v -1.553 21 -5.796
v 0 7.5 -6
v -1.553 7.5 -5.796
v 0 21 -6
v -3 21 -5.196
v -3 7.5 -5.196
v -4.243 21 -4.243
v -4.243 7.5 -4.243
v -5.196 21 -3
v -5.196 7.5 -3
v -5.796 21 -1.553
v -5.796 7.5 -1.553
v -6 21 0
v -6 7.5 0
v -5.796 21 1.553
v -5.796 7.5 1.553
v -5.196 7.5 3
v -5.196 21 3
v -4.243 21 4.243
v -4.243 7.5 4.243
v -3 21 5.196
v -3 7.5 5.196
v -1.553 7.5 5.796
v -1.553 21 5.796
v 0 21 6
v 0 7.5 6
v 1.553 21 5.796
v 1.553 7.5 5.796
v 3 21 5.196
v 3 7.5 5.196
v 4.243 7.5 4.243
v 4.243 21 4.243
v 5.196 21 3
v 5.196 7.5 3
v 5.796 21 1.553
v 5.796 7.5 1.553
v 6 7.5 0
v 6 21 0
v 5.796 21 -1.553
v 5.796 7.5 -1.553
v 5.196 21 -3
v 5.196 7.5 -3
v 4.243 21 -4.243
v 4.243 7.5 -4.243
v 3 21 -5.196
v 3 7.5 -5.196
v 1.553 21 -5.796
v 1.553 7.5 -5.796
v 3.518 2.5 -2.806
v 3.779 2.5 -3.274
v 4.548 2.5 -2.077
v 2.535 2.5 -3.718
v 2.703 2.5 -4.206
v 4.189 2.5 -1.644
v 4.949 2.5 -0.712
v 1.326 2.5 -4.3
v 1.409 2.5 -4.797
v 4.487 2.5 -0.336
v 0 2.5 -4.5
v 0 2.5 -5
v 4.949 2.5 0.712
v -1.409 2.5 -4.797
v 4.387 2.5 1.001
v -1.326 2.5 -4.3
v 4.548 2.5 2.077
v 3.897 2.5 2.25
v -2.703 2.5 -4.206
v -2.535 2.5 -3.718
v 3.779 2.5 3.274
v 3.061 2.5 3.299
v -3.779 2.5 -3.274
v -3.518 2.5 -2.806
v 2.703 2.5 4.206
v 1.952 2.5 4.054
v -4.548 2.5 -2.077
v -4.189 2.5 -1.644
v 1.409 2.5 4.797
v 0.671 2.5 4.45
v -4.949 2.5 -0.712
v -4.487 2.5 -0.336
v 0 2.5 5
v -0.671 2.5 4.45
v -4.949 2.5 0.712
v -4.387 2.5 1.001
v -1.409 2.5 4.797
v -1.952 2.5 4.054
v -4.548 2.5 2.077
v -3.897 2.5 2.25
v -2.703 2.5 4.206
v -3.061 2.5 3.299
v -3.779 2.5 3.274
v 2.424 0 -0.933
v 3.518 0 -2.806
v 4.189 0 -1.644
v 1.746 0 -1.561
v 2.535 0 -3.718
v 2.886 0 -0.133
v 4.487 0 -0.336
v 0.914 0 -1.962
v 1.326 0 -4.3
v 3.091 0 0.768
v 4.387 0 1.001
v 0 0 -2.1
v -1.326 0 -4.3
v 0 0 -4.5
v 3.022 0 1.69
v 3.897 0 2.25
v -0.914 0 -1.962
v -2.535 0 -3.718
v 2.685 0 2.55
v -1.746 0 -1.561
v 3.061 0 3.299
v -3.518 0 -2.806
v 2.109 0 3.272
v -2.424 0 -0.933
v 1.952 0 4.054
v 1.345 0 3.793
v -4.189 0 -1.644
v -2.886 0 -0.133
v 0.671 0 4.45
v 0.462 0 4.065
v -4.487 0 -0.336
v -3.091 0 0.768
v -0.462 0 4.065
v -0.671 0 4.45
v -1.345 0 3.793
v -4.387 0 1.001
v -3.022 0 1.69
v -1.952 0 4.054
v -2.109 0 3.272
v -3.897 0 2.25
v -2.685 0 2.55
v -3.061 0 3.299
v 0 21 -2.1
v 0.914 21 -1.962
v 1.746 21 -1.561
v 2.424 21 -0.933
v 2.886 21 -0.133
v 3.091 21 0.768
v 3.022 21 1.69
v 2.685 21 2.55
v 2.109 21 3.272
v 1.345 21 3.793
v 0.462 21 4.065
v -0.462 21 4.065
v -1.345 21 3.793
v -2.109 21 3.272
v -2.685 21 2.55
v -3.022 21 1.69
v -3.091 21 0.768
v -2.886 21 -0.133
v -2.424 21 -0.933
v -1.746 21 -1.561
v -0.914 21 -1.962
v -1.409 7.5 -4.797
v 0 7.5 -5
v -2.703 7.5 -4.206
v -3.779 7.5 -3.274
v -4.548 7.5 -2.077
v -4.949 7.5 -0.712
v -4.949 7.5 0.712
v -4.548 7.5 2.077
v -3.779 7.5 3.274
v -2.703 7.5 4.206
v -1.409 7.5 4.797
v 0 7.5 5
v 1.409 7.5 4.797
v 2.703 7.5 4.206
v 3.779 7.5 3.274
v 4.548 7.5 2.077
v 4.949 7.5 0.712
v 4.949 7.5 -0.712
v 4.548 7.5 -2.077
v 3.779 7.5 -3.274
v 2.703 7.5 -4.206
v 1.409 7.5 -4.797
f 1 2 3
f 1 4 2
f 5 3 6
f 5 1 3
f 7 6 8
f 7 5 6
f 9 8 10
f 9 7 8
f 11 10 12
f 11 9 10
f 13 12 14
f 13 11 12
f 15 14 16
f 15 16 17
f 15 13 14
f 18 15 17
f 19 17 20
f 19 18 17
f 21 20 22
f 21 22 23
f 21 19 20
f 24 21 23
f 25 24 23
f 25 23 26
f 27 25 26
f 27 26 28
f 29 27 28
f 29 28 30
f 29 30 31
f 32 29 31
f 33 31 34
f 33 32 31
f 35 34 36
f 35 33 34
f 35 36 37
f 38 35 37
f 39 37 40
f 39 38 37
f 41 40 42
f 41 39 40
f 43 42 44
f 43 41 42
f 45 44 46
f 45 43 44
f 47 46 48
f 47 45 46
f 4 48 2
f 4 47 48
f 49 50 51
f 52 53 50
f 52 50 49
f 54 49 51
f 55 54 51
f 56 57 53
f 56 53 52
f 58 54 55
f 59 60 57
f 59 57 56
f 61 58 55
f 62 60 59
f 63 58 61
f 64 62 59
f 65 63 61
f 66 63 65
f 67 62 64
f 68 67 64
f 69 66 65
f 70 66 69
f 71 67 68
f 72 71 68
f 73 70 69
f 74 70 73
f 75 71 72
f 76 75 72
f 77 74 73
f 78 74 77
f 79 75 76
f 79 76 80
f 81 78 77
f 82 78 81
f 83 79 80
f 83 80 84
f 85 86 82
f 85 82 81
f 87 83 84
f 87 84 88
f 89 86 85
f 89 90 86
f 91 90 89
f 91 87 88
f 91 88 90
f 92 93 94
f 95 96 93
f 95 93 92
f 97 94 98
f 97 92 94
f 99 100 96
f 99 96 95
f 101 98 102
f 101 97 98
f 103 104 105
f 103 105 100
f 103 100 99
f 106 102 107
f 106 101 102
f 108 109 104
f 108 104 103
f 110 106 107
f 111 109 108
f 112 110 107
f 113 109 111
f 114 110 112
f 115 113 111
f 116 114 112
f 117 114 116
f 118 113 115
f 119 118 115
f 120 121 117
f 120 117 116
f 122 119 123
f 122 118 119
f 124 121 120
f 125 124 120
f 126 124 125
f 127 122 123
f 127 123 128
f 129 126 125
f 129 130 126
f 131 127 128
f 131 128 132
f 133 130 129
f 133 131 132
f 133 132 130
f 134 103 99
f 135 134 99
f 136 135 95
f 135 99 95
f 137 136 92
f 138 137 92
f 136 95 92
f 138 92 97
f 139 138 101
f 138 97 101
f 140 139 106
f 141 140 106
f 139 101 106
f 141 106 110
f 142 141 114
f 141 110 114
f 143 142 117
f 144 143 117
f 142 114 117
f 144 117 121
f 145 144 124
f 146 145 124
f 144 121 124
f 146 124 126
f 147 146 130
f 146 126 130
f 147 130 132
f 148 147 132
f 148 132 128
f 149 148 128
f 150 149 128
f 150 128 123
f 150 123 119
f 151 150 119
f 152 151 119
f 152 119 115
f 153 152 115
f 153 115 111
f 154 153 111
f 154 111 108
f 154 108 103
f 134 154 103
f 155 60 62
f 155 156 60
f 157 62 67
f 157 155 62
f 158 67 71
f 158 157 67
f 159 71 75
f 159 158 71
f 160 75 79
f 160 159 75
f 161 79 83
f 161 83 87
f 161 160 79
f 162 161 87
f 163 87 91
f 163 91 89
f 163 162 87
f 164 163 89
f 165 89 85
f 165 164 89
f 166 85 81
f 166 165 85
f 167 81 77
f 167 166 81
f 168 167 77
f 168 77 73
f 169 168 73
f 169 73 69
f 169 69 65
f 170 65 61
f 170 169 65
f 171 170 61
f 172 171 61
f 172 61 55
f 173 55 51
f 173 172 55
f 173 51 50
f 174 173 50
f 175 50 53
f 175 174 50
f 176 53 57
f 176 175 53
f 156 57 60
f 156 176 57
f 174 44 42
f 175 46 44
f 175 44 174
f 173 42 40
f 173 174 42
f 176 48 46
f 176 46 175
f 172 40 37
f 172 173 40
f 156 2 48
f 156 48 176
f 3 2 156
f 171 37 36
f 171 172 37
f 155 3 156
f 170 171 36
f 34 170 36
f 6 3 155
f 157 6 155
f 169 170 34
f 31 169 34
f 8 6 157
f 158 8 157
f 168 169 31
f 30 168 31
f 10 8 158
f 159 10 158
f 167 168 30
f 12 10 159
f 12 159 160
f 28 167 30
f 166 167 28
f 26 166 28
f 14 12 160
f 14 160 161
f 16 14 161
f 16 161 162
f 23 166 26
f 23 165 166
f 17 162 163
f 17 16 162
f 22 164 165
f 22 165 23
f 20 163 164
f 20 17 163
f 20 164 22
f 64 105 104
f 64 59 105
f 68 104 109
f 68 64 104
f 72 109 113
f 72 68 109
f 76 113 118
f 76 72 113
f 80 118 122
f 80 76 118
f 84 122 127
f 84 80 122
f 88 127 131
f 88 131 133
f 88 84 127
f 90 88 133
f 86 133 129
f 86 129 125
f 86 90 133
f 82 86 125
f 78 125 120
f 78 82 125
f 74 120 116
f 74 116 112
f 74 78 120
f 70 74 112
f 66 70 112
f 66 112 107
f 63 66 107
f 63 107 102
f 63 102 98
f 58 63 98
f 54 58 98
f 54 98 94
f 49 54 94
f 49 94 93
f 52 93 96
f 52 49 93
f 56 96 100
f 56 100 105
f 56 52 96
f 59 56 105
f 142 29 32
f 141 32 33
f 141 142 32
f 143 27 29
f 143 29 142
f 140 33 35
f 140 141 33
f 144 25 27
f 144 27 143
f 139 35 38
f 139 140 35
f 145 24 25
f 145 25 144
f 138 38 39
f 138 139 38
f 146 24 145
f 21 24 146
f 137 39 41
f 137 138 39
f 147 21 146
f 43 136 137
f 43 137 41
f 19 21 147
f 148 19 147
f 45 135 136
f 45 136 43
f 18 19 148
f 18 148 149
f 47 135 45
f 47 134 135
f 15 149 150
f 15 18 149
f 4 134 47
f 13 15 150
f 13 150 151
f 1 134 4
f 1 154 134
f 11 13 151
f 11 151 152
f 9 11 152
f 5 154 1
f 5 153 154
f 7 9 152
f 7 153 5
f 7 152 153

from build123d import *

# Parameters (mm, degrees)
SKETCH5_R          = 3.1
CUT_EXTRUDE1_DEPTH = 23.649503306


with BuildPart() as part:
    # Sketch4 → Revolve1 (revolve)
    with BuildSketch(Plane(origin=(0, 0, 0), x_dir=(0, 0, -1), z_dir=(1, 0, 0)), mode=Mode.PRIVATE) as revolve1_sk:
        Polygon((-4.5, 2.5), (-5, 2.5), (-5, 7.5), (-6, 7.5), (-6, 21), (0, 21), (0, 0), (-4.5, 0), align=None)
    revolve(revolve1_sk.sketch.rotate(Axis((0, -43.514912226, 0), (0, 1, 0)), 180), axis=Axis((0, -43.514912226, 0), (0, 1, 0)))

    # Sketch5 → Cut-Extrude1 (cut, through all)
    with BuildSketch(Plane.XZ):
        with Locations(Location((0, 1, 0), (0, 0, 270))):
            Circle(SKETCH5_R)
    extrude(amount=-CUT_EXTRUDE1_DEPTH, mode=Mode.SUBTRACT)


solid = part.part
